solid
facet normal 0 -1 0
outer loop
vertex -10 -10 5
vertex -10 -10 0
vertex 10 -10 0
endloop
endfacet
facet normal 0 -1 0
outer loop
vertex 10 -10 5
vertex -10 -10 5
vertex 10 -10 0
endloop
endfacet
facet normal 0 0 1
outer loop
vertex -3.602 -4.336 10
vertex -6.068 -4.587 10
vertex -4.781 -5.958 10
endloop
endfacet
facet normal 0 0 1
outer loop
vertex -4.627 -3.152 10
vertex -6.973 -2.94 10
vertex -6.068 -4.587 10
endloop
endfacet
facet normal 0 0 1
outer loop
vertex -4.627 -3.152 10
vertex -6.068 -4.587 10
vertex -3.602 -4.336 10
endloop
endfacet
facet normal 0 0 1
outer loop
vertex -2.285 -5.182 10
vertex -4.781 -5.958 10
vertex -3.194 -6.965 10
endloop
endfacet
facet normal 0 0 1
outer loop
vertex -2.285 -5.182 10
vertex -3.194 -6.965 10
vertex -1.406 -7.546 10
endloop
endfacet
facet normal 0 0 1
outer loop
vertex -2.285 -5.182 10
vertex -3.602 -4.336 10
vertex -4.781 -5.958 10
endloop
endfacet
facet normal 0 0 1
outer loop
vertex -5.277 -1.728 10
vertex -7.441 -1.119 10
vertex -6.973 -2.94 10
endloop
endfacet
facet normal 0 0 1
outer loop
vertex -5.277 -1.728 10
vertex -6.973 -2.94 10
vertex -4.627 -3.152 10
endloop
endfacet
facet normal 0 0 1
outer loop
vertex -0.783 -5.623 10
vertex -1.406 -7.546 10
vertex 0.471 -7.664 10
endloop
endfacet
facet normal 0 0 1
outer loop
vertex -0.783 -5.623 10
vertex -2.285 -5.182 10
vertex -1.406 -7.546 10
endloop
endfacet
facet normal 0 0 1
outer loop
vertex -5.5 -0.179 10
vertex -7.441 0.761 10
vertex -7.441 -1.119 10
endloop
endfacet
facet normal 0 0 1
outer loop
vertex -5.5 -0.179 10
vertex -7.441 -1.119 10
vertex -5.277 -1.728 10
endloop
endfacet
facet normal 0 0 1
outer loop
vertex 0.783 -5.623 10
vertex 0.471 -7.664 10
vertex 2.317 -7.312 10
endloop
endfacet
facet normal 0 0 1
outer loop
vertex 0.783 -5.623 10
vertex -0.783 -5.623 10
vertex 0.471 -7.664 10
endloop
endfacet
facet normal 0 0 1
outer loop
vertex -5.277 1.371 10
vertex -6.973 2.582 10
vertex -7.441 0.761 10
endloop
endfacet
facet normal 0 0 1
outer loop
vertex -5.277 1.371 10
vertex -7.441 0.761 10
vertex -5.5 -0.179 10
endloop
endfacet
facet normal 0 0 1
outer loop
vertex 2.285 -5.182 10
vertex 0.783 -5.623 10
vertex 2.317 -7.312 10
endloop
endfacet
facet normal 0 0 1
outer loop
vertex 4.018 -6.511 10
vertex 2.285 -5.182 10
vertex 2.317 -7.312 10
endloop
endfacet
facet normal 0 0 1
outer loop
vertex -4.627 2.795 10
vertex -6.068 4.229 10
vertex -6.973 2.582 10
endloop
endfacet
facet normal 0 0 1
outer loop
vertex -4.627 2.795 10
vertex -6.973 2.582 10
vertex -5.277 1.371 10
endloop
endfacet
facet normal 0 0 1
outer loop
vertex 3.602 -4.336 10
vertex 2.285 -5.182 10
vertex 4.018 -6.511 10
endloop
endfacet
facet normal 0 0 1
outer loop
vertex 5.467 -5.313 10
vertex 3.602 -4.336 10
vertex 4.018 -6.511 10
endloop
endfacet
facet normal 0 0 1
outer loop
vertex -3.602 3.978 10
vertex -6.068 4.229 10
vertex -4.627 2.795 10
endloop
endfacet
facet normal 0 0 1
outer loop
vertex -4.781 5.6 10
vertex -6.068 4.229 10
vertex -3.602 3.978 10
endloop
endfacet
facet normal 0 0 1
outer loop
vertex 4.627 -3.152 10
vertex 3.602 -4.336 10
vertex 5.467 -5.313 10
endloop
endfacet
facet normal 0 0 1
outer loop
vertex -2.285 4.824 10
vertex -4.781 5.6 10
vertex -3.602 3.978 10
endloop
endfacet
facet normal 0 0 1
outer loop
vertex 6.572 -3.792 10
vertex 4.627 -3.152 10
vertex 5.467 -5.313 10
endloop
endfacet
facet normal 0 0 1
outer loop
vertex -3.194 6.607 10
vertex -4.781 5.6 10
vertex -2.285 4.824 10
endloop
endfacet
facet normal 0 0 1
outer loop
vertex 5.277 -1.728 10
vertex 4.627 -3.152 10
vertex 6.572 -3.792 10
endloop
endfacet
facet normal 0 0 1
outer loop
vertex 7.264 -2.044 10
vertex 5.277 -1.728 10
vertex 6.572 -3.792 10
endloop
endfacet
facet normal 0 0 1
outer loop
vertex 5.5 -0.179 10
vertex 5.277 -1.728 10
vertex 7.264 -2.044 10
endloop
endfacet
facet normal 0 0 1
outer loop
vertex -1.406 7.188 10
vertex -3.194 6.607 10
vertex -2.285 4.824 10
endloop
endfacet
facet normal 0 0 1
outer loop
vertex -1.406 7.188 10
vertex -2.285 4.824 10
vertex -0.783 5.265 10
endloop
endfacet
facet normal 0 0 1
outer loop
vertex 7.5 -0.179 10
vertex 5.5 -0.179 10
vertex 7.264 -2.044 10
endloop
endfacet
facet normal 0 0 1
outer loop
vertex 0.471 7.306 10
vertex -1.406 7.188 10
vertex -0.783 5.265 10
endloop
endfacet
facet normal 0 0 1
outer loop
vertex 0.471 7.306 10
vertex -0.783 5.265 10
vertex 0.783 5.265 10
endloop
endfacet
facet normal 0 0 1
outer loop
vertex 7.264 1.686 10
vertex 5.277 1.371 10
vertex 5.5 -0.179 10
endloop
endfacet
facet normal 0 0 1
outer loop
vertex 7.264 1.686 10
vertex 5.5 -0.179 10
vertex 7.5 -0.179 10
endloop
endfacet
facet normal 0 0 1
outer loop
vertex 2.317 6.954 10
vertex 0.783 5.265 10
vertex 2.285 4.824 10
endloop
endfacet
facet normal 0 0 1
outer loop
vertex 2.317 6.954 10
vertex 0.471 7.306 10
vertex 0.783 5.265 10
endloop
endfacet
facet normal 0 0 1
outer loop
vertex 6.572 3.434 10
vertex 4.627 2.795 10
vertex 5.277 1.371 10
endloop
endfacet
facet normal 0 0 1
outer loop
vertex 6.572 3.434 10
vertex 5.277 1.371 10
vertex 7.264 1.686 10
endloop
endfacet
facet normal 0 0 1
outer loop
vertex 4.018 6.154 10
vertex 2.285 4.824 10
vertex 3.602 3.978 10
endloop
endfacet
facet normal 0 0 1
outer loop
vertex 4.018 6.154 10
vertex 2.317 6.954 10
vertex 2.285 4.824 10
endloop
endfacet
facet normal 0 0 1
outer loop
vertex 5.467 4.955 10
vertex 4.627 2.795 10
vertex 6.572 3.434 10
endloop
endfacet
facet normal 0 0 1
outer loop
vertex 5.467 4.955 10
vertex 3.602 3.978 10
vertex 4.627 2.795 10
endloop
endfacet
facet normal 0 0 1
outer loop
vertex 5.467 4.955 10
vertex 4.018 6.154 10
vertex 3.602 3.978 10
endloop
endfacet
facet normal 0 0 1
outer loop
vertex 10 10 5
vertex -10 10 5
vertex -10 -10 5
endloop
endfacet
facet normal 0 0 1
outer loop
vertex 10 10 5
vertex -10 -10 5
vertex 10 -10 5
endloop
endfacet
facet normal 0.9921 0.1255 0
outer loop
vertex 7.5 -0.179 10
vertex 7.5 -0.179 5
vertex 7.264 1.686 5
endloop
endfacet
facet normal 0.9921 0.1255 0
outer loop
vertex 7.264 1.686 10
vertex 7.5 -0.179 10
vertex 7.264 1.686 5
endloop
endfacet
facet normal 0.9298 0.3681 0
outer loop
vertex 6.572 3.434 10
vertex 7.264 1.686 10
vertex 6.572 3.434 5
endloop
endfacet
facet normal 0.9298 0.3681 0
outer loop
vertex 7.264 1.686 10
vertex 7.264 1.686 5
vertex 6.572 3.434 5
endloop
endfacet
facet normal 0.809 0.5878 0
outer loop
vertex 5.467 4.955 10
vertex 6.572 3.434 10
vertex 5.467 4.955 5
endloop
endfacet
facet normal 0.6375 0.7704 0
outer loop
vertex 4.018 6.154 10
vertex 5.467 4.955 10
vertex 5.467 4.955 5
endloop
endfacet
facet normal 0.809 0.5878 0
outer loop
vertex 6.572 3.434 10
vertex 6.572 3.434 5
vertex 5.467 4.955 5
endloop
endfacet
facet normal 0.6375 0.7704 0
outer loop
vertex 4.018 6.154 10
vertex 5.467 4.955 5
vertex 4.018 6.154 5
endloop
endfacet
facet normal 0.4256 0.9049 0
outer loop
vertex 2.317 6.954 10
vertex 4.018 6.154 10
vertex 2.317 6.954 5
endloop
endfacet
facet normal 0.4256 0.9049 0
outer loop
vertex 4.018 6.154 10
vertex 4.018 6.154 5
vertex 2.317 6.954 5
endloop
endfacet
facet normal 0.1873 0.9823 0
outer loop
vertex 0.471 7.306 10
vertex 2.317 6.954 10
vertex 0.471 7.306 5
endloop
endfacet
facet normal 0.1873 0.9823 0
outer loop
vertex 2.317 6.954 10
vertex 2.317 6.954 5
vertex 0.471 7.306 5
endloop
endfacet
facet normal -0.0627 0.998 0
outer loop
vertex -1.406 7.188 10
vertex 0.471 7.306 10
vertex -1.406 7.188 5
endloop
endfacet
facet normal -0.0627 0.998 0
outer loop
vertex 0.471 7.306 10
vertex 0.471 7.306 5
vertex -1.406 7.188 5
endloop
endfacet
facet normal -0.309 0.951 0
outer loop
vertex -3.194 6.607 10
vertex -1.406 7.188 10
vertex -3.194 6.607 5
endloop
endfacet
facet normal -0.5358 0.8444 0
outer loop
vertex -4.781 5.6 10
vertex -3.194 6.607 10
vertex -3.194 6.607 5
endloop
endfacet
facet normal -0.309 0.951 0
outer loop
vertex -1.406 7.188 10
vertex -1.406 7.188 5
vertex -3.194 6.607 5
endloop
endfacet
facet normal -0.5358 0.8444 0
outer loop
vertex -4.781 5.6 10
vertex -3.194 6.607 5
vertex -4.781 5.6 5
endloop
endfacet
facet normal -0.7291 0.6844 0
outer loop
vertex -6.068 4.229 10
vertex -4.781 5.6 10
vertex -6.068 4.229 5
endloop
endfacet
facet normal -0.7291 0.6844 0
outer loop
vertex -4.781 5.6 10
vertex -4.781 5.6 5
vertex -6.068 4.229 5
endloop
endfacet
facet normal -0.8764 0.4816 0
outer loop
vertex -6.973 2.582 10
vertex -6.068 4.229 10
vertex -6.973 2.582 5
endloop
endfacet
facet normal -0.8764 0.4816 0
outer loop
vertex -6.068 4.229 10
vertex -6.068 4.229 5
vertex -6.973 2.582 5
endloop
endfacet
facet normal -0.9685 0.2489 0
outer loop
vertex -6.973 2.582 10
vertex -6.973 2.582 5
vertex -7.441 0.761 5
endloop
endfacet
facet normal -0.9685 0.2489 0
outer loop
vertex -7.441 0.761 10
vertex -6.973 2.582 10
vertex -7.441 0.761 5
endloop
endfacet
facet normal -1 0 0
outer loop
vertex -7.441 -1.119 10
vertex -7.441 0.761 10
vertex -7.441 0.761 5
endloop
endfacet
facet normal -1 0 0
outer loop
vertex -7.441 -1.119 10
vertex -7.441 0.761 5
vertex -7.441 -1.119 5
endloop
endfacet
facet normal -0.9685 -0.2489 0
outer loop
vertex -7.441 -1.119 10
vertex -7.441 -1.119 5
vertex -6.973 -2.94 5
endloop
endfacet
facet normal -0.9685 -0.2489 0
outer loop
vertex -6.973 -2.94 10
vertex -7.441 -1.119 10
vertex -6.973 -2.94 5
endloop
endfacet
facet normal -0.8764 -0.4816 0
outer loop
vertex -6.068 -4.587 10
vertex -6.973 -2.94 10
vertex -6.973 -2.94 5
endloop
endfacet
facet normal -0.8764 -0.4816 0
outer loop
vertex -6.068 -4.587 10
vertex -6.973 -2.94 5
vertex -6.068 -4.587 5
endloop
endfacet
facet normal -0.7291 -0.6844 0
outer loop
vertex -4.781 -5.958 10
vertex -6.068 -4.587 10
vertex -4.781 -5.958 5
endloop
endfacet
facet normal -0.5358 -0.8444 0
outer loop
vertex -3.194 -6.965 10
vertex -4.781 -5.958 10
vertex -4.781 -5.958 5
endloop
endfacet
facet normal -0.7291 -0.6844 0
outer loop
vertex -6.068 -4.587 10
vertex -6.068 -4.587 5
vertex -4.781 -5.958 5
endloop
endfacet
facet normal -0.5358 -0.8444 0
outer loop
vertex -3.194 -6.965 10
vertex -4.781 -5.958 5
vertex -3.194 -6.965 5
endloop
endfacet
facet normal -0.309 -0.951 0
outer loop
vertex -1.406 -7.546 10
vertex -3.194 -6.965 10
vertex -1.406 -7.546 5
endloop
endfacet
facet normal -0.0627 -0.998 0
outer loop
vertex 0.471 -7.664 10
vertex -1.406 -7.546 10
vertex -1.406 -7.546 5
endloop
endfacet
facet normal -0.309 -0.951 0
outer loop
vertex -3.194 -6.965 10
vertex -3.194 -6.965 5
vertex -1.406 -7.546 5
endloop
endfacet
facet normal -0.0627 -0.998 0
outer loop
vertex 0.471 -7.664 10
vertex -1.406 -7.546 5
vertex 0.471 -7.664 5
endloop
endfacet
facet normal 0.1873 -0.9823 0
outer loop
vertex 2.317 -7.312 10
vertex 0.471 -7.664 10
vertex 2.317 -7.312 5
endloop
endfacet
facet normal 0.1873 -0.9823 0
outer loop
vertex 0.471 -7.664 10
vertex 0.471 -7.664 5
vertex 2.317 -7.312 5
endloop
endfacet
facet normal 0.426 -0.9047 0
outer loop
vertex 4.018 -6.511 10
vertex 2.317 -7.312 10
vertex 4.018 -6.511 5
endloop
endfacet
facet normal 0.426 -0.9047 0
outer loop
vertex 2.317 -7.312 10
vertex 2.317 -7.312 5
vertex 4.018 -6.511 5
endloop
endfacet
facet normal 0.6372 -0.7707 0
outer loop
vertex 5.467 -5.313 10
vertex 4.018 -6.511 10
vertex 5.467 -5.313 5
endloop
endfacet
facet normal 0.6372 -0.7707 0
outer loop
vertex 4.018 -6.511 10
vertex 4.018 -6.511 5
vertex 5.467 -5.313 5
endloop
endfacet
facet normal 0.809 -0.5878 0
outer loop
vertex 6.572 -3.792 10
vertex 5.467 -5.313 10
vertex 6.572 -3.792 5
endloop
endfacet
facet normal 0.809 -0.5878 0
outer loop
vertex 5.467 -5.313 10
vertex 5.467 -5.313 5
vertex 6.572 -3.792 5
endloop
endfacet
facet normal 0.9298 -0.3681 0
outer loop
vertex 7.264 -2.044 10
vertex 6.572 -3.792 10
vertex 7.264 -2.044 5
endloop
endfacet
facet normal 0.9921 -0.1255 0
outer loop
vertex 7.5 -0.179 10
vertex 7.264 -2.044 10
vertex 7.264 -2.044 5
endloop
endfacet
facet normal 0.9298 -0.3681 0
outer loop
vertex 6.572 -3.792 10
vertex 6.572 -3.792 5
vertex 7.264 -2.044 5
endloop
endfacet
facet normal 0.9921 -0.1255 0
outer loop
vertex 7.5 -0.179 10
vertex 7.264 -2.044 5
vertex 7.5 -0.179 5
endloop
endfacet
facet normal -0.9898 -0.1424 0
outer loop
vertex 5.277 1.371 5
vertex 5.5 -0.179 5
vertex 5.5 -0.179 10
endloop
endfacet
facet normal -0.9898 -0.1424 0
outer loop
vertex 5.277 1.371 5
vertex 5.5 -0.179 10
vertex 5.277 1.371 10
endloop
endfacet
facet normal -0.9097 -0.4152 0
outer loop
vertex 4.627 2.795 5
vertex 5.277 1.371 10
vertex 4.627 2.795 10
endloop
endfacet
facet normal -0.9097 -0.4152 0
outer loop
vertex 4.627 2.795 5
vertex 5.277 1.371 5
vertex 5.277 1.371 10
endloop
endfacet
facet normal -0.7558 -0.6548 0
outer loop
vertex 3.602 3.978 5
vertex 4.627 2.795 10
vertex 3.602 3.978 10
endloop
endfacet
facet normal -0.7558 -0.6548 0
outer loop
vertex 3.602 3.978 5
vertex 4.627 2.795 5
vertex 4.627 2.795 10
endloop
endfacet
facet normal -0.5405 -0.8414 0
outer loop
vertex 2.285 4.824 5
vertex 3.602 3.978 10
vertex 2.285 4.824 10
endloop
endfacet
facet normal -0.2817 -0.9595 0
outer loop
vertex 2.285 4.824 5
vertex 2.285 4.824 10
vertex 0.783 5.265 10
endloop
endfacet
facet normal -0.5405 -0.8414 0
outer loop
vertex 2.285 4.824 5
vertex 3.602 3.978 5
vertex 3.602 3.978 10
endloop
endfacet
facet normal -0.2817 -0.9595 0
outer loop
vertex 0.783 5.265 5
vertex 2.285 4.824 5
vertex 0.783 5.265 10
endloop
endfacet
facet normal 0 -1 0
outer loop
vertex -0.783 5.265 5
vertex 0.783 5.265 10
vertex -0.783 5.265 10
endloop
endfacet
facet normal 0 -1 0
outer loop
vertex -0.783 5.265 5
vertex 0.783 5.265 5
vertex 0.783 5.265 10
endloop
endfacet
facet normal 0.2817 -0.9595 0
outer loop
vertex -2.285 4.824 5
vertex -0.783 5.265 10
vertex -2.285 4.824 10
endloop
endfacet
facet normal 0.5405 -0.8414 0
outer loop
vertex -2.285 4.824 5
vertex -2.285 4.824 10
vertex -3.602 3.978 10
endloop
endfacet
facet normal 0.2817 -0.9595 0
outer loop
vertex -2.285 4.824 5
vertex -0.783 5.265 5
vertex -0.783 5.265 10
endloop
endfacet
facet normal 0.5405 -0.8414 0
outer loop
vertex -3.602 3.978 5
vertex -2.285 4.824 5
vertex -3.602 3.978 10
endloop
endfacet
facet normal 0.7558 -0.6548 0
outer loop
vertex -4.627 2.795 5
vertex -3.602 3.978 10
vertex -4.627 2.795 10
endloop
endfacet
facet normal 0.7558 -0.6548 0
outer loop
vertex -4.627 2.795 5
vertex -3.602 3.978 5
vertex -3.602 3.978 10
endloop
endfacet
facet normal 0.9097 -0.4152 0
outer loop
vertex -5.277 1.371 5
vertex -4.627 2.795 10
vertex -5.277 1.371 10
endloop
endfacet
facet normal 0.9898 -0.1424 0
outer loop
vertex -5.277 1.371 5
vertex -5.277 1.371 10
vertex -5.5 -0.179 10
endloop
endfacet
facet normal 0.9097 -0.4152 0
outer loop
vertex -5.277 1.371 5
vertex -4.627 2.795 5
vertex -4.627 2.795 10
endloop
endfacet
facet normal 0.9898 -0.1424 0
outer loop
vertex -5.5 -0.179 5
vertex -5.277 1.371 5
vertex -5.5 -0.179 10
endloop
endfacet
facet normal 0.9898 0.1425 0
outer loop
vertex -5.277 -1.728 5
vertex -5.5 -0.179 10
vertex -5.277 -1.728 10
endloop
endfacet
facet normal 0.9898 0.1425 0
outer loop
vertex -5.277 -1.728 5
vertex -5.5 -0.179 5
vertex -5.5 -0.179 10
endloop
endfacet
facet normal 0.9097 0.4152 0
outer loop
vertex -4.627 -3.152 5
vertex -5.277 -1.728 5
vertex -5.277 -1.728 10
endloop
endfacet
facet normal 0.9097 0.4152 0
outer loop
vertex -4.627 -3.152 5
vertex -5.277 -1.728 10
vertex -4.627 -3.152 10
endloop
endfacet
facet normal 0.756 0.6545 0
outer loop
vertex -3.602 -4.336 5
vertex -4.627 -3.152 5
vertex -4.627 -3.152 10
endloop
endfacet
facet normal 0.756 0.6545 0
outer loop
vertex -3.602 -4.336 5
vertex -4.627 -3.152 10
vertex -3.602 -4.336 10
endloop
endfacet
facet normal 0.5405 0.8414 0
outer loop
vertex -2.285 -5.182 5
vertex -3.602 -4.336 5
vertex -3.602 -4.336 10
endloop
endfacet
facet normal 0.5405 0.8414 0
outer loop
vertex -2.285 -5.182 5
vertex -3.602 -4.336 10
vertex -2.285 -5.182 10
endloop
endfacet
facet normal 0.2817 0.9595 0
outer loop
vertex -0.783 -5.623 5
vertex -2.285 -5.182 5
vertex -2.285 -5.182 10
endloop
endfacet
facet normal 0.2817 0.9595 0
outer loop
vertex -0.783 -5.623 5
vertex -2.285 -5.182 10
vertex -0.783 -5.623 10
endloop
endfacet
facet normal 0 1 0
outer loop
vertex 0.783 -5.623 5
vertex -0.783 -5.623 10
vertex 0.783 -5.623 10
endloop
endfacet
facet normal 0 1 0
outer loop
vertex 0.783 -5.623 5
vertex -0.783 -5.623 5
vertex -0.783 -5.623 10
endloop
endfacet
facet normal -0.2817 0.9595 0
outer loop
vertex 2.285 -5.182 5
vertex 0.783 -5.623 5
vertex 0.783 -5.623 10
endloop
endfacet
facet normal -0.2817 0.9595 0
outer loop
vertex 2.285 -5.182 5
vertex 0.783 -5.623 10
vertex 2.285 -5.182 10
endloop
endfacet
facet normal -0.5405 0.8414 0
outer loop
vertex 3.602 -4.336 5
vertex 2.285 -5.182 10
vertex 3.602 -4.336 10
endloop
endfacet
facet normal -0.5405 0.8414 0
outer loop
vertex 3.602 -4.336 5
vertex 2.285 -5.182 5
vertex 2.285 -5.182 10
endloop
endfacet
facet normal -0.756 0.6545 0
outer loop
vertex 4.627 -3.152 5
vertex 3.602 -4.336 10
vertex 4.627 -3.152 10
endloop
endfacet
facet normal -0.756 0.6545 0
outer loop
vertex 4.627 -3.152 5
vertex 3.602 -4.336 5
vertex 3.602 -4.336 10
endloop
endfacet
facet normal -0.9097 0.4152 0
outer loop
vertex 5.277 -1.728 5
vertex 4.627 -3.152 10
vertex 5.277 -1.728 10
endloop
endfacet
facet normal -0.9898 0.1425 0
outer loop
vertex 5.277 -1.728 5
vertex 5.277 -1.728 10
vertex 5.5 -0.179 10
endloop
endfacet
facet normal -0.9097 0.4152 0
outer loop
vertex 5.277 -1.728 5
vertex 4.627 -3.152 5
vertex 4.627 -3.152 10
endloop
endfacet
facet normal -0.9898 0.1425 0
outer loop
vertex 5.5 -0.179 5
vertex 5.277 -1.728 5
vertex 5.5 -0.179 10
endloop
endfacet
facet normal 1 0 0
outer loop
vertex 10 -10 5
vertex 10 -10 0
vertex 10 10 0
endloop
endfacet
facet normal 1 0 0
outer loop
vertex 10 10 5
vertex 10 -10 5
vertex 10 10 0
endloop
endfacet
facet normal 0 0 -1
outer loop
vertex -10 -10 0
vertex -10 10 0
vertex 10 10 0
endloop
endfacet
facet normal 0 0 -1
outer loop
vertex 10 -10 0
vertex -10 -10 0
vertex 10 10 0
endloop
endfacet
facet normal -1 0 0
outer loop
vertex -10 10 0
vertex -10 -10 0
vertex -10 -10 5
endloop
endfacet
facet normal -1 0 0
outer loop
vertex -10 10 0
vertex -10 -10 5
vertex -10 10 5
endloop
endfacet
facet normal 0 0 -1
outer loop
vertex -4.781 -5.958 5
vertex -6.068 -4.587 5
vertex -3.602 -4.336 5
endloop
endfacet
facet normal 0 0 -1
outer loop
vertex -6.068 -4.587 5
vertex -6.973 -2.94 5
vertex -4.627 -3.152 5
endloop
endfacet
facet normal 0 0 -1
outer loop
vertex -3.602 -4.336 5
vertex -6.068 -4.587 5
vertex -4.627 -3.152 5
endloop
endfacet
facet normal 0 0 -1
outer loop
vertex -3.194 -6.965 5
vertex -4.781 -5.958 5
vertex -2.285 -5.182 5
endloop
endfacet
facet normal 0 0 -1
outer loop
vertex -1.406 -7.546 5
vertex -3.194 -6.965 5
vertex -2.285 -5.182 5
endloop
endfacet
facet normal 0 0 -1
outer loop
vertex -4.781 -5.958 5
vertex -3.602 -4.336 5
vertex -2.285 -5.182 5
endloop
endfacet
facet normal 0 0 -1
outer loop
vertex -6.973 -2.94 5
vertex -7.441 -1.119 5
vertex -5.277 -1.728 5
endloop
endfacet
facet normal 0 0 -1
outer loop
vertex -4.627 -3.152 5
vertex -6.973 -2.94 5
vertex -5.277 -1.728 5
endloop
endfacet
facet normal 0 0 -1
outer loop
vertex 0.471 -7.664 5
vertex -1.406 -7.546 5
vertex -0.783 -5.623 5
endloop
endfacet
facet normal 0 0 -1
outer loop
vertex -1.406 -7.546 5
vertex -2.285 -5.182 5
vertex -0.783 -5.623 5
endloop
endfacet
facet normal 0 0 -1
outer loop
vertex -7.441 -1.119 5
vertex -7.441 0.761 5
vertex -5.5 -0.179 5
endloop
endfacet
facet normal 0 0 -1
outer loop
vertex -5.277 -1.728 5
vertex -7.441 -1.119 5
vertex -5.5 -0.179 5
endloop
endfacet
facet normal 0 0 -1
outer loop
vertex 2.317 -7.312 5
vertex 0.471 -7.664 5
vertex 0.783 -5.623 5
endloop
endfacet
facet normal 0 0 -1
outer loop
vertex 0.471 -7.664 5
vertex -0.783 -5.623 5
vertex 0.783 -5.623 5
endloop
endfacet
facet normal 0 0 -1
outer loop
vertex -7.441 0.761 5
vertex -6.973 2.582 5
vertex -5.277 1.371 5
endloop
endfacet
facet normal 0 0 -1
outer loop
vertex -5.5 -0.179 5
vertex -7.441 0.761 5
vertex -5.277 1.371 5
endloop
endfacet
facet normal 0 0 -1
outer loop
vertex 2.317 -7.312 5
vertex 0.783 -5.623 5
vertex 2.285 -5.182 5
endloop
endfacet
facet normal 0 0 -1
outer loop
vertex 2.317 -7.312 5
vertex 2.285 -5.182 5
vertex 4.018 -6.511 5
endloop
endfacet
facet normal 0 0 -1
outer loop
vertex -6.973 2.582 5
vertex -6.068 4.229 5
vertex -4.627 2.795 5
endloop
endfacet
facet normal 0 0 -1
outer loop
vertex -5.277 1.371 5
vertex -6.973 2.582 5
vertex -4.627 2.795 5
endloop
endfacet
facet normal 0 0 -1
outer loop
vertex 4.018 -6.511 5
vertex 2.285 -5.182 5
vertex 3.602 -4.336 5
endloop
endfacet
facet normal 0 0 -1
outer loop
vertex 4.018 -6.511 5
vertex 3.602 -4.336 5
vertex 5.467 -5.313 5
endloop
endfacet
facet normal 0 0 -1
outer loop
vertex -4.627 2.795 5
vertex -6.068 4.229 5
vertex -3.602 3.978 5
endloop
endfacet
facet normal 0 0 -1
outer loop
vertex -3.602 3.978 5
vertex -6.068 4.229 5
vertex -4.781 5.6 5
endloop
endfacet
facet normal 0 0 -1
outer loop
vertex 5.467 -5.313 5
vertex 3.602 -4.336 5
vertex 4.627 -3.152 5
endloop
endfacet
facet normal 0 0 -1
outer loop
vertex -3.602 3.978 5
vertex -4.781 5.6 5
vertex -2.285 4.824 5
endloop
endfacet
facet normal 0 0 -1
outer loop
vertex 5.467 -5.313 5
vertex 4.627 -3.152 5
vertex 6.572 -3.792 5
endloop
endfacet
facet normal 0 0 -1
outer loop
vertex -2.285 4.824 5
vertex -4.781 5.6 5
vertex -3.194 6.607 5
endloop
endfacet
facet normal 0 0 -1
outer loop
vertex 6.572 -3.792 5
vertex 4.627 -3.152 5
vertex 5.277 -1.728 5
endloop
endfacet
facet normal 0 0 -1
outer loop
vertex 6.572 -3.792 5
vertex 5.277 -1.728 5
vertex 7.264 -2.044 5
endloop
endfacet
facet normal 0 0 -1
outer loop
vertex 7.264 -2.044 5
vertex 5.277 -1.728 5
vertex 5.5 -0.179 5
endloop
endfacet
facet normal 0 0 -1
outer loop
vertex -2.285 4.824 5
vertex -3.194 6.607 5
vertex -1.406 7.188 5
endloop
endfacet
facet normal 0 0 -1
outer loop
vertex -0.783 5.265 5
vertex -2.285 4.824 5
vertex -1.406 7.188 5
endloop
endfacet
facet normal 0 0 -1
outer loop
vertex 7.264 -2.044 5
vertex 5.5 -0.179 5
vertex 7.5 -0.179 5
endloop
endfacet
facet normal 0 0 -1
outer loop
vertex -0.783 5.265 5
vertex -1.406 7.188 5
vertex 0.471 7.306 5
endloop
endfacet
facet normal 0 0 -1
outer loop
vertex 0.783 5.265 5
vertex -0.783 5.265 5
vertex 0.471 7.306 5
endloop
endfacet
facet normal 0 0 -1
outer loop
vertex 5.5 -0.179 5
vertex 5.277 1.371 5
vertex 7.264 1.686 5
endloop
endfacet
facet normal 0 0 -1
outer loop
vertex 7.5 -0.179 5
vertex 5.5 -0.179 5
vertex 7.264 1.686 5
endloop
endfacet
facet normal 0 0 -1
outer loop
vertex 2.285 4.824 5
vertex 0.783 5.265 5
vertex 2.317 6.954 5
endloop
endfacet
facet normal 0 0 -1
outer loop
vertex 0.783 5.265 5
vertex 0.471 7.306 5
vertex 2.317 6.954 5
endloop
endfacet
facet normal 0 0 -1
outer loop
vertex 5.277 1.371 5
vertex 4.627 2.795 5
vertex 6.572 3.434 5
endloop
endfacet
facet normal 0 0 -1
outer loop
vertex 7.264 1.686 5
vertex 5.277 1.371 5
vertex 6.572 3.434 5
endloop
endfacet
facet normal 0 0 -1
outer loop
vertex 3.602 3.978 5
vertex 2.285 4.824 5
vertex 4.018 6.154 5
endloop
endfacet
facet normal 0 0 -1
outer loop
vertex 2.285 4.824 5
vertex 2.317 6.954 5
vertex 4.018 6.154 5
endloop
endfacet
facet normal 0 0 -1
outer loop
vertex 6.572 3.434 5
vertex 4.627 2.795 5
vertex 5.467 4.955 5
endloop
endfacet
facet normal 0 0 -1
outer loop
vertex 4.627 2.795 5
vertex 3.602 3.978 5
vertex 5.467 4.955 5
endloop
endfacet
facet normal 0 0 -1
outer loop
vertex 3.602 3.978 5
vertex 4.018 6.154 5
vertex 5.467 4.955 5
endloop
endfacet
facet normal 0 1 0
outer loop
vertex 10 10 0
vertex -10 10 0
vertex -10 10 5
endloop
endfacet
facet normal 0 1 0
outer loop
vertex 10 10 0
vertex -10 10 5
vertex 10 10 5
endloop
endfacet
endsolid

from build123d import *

# Parameters (mm, degrees)
SKETCH_W      = 20
SKETCH_H      = 20
PAD_DEPTH     = 5
SKETCH002_R   = 7.499964
SKETCH002_R_2 = 5.5
PAD001_DEPTH  = 5


with BuildPart() as body:
    # Sketch → Pad (new body)
    with BuildSketch(Plane.XY):
        Rectangle(SKETCH_W, SKETCH_H)
    extrude(amount=PAD_DEPTH)


with BuildPart() as body001:
    # Sketch002 → Pad001 (new body)
    with BuildSketch(Plane.XY.offset(5)):
        with Locations((-0.0002, -0.17892)):
            Circle(SKETCH002_R)
        with Locations((-0.0002, -0.17892)):
            Circle(SKETCH002_R_2, mode=Mode.SUBTRACT)
    extrude(amount=PAD001_DEPTH)


solid = Compound([body.part, body001.part])
